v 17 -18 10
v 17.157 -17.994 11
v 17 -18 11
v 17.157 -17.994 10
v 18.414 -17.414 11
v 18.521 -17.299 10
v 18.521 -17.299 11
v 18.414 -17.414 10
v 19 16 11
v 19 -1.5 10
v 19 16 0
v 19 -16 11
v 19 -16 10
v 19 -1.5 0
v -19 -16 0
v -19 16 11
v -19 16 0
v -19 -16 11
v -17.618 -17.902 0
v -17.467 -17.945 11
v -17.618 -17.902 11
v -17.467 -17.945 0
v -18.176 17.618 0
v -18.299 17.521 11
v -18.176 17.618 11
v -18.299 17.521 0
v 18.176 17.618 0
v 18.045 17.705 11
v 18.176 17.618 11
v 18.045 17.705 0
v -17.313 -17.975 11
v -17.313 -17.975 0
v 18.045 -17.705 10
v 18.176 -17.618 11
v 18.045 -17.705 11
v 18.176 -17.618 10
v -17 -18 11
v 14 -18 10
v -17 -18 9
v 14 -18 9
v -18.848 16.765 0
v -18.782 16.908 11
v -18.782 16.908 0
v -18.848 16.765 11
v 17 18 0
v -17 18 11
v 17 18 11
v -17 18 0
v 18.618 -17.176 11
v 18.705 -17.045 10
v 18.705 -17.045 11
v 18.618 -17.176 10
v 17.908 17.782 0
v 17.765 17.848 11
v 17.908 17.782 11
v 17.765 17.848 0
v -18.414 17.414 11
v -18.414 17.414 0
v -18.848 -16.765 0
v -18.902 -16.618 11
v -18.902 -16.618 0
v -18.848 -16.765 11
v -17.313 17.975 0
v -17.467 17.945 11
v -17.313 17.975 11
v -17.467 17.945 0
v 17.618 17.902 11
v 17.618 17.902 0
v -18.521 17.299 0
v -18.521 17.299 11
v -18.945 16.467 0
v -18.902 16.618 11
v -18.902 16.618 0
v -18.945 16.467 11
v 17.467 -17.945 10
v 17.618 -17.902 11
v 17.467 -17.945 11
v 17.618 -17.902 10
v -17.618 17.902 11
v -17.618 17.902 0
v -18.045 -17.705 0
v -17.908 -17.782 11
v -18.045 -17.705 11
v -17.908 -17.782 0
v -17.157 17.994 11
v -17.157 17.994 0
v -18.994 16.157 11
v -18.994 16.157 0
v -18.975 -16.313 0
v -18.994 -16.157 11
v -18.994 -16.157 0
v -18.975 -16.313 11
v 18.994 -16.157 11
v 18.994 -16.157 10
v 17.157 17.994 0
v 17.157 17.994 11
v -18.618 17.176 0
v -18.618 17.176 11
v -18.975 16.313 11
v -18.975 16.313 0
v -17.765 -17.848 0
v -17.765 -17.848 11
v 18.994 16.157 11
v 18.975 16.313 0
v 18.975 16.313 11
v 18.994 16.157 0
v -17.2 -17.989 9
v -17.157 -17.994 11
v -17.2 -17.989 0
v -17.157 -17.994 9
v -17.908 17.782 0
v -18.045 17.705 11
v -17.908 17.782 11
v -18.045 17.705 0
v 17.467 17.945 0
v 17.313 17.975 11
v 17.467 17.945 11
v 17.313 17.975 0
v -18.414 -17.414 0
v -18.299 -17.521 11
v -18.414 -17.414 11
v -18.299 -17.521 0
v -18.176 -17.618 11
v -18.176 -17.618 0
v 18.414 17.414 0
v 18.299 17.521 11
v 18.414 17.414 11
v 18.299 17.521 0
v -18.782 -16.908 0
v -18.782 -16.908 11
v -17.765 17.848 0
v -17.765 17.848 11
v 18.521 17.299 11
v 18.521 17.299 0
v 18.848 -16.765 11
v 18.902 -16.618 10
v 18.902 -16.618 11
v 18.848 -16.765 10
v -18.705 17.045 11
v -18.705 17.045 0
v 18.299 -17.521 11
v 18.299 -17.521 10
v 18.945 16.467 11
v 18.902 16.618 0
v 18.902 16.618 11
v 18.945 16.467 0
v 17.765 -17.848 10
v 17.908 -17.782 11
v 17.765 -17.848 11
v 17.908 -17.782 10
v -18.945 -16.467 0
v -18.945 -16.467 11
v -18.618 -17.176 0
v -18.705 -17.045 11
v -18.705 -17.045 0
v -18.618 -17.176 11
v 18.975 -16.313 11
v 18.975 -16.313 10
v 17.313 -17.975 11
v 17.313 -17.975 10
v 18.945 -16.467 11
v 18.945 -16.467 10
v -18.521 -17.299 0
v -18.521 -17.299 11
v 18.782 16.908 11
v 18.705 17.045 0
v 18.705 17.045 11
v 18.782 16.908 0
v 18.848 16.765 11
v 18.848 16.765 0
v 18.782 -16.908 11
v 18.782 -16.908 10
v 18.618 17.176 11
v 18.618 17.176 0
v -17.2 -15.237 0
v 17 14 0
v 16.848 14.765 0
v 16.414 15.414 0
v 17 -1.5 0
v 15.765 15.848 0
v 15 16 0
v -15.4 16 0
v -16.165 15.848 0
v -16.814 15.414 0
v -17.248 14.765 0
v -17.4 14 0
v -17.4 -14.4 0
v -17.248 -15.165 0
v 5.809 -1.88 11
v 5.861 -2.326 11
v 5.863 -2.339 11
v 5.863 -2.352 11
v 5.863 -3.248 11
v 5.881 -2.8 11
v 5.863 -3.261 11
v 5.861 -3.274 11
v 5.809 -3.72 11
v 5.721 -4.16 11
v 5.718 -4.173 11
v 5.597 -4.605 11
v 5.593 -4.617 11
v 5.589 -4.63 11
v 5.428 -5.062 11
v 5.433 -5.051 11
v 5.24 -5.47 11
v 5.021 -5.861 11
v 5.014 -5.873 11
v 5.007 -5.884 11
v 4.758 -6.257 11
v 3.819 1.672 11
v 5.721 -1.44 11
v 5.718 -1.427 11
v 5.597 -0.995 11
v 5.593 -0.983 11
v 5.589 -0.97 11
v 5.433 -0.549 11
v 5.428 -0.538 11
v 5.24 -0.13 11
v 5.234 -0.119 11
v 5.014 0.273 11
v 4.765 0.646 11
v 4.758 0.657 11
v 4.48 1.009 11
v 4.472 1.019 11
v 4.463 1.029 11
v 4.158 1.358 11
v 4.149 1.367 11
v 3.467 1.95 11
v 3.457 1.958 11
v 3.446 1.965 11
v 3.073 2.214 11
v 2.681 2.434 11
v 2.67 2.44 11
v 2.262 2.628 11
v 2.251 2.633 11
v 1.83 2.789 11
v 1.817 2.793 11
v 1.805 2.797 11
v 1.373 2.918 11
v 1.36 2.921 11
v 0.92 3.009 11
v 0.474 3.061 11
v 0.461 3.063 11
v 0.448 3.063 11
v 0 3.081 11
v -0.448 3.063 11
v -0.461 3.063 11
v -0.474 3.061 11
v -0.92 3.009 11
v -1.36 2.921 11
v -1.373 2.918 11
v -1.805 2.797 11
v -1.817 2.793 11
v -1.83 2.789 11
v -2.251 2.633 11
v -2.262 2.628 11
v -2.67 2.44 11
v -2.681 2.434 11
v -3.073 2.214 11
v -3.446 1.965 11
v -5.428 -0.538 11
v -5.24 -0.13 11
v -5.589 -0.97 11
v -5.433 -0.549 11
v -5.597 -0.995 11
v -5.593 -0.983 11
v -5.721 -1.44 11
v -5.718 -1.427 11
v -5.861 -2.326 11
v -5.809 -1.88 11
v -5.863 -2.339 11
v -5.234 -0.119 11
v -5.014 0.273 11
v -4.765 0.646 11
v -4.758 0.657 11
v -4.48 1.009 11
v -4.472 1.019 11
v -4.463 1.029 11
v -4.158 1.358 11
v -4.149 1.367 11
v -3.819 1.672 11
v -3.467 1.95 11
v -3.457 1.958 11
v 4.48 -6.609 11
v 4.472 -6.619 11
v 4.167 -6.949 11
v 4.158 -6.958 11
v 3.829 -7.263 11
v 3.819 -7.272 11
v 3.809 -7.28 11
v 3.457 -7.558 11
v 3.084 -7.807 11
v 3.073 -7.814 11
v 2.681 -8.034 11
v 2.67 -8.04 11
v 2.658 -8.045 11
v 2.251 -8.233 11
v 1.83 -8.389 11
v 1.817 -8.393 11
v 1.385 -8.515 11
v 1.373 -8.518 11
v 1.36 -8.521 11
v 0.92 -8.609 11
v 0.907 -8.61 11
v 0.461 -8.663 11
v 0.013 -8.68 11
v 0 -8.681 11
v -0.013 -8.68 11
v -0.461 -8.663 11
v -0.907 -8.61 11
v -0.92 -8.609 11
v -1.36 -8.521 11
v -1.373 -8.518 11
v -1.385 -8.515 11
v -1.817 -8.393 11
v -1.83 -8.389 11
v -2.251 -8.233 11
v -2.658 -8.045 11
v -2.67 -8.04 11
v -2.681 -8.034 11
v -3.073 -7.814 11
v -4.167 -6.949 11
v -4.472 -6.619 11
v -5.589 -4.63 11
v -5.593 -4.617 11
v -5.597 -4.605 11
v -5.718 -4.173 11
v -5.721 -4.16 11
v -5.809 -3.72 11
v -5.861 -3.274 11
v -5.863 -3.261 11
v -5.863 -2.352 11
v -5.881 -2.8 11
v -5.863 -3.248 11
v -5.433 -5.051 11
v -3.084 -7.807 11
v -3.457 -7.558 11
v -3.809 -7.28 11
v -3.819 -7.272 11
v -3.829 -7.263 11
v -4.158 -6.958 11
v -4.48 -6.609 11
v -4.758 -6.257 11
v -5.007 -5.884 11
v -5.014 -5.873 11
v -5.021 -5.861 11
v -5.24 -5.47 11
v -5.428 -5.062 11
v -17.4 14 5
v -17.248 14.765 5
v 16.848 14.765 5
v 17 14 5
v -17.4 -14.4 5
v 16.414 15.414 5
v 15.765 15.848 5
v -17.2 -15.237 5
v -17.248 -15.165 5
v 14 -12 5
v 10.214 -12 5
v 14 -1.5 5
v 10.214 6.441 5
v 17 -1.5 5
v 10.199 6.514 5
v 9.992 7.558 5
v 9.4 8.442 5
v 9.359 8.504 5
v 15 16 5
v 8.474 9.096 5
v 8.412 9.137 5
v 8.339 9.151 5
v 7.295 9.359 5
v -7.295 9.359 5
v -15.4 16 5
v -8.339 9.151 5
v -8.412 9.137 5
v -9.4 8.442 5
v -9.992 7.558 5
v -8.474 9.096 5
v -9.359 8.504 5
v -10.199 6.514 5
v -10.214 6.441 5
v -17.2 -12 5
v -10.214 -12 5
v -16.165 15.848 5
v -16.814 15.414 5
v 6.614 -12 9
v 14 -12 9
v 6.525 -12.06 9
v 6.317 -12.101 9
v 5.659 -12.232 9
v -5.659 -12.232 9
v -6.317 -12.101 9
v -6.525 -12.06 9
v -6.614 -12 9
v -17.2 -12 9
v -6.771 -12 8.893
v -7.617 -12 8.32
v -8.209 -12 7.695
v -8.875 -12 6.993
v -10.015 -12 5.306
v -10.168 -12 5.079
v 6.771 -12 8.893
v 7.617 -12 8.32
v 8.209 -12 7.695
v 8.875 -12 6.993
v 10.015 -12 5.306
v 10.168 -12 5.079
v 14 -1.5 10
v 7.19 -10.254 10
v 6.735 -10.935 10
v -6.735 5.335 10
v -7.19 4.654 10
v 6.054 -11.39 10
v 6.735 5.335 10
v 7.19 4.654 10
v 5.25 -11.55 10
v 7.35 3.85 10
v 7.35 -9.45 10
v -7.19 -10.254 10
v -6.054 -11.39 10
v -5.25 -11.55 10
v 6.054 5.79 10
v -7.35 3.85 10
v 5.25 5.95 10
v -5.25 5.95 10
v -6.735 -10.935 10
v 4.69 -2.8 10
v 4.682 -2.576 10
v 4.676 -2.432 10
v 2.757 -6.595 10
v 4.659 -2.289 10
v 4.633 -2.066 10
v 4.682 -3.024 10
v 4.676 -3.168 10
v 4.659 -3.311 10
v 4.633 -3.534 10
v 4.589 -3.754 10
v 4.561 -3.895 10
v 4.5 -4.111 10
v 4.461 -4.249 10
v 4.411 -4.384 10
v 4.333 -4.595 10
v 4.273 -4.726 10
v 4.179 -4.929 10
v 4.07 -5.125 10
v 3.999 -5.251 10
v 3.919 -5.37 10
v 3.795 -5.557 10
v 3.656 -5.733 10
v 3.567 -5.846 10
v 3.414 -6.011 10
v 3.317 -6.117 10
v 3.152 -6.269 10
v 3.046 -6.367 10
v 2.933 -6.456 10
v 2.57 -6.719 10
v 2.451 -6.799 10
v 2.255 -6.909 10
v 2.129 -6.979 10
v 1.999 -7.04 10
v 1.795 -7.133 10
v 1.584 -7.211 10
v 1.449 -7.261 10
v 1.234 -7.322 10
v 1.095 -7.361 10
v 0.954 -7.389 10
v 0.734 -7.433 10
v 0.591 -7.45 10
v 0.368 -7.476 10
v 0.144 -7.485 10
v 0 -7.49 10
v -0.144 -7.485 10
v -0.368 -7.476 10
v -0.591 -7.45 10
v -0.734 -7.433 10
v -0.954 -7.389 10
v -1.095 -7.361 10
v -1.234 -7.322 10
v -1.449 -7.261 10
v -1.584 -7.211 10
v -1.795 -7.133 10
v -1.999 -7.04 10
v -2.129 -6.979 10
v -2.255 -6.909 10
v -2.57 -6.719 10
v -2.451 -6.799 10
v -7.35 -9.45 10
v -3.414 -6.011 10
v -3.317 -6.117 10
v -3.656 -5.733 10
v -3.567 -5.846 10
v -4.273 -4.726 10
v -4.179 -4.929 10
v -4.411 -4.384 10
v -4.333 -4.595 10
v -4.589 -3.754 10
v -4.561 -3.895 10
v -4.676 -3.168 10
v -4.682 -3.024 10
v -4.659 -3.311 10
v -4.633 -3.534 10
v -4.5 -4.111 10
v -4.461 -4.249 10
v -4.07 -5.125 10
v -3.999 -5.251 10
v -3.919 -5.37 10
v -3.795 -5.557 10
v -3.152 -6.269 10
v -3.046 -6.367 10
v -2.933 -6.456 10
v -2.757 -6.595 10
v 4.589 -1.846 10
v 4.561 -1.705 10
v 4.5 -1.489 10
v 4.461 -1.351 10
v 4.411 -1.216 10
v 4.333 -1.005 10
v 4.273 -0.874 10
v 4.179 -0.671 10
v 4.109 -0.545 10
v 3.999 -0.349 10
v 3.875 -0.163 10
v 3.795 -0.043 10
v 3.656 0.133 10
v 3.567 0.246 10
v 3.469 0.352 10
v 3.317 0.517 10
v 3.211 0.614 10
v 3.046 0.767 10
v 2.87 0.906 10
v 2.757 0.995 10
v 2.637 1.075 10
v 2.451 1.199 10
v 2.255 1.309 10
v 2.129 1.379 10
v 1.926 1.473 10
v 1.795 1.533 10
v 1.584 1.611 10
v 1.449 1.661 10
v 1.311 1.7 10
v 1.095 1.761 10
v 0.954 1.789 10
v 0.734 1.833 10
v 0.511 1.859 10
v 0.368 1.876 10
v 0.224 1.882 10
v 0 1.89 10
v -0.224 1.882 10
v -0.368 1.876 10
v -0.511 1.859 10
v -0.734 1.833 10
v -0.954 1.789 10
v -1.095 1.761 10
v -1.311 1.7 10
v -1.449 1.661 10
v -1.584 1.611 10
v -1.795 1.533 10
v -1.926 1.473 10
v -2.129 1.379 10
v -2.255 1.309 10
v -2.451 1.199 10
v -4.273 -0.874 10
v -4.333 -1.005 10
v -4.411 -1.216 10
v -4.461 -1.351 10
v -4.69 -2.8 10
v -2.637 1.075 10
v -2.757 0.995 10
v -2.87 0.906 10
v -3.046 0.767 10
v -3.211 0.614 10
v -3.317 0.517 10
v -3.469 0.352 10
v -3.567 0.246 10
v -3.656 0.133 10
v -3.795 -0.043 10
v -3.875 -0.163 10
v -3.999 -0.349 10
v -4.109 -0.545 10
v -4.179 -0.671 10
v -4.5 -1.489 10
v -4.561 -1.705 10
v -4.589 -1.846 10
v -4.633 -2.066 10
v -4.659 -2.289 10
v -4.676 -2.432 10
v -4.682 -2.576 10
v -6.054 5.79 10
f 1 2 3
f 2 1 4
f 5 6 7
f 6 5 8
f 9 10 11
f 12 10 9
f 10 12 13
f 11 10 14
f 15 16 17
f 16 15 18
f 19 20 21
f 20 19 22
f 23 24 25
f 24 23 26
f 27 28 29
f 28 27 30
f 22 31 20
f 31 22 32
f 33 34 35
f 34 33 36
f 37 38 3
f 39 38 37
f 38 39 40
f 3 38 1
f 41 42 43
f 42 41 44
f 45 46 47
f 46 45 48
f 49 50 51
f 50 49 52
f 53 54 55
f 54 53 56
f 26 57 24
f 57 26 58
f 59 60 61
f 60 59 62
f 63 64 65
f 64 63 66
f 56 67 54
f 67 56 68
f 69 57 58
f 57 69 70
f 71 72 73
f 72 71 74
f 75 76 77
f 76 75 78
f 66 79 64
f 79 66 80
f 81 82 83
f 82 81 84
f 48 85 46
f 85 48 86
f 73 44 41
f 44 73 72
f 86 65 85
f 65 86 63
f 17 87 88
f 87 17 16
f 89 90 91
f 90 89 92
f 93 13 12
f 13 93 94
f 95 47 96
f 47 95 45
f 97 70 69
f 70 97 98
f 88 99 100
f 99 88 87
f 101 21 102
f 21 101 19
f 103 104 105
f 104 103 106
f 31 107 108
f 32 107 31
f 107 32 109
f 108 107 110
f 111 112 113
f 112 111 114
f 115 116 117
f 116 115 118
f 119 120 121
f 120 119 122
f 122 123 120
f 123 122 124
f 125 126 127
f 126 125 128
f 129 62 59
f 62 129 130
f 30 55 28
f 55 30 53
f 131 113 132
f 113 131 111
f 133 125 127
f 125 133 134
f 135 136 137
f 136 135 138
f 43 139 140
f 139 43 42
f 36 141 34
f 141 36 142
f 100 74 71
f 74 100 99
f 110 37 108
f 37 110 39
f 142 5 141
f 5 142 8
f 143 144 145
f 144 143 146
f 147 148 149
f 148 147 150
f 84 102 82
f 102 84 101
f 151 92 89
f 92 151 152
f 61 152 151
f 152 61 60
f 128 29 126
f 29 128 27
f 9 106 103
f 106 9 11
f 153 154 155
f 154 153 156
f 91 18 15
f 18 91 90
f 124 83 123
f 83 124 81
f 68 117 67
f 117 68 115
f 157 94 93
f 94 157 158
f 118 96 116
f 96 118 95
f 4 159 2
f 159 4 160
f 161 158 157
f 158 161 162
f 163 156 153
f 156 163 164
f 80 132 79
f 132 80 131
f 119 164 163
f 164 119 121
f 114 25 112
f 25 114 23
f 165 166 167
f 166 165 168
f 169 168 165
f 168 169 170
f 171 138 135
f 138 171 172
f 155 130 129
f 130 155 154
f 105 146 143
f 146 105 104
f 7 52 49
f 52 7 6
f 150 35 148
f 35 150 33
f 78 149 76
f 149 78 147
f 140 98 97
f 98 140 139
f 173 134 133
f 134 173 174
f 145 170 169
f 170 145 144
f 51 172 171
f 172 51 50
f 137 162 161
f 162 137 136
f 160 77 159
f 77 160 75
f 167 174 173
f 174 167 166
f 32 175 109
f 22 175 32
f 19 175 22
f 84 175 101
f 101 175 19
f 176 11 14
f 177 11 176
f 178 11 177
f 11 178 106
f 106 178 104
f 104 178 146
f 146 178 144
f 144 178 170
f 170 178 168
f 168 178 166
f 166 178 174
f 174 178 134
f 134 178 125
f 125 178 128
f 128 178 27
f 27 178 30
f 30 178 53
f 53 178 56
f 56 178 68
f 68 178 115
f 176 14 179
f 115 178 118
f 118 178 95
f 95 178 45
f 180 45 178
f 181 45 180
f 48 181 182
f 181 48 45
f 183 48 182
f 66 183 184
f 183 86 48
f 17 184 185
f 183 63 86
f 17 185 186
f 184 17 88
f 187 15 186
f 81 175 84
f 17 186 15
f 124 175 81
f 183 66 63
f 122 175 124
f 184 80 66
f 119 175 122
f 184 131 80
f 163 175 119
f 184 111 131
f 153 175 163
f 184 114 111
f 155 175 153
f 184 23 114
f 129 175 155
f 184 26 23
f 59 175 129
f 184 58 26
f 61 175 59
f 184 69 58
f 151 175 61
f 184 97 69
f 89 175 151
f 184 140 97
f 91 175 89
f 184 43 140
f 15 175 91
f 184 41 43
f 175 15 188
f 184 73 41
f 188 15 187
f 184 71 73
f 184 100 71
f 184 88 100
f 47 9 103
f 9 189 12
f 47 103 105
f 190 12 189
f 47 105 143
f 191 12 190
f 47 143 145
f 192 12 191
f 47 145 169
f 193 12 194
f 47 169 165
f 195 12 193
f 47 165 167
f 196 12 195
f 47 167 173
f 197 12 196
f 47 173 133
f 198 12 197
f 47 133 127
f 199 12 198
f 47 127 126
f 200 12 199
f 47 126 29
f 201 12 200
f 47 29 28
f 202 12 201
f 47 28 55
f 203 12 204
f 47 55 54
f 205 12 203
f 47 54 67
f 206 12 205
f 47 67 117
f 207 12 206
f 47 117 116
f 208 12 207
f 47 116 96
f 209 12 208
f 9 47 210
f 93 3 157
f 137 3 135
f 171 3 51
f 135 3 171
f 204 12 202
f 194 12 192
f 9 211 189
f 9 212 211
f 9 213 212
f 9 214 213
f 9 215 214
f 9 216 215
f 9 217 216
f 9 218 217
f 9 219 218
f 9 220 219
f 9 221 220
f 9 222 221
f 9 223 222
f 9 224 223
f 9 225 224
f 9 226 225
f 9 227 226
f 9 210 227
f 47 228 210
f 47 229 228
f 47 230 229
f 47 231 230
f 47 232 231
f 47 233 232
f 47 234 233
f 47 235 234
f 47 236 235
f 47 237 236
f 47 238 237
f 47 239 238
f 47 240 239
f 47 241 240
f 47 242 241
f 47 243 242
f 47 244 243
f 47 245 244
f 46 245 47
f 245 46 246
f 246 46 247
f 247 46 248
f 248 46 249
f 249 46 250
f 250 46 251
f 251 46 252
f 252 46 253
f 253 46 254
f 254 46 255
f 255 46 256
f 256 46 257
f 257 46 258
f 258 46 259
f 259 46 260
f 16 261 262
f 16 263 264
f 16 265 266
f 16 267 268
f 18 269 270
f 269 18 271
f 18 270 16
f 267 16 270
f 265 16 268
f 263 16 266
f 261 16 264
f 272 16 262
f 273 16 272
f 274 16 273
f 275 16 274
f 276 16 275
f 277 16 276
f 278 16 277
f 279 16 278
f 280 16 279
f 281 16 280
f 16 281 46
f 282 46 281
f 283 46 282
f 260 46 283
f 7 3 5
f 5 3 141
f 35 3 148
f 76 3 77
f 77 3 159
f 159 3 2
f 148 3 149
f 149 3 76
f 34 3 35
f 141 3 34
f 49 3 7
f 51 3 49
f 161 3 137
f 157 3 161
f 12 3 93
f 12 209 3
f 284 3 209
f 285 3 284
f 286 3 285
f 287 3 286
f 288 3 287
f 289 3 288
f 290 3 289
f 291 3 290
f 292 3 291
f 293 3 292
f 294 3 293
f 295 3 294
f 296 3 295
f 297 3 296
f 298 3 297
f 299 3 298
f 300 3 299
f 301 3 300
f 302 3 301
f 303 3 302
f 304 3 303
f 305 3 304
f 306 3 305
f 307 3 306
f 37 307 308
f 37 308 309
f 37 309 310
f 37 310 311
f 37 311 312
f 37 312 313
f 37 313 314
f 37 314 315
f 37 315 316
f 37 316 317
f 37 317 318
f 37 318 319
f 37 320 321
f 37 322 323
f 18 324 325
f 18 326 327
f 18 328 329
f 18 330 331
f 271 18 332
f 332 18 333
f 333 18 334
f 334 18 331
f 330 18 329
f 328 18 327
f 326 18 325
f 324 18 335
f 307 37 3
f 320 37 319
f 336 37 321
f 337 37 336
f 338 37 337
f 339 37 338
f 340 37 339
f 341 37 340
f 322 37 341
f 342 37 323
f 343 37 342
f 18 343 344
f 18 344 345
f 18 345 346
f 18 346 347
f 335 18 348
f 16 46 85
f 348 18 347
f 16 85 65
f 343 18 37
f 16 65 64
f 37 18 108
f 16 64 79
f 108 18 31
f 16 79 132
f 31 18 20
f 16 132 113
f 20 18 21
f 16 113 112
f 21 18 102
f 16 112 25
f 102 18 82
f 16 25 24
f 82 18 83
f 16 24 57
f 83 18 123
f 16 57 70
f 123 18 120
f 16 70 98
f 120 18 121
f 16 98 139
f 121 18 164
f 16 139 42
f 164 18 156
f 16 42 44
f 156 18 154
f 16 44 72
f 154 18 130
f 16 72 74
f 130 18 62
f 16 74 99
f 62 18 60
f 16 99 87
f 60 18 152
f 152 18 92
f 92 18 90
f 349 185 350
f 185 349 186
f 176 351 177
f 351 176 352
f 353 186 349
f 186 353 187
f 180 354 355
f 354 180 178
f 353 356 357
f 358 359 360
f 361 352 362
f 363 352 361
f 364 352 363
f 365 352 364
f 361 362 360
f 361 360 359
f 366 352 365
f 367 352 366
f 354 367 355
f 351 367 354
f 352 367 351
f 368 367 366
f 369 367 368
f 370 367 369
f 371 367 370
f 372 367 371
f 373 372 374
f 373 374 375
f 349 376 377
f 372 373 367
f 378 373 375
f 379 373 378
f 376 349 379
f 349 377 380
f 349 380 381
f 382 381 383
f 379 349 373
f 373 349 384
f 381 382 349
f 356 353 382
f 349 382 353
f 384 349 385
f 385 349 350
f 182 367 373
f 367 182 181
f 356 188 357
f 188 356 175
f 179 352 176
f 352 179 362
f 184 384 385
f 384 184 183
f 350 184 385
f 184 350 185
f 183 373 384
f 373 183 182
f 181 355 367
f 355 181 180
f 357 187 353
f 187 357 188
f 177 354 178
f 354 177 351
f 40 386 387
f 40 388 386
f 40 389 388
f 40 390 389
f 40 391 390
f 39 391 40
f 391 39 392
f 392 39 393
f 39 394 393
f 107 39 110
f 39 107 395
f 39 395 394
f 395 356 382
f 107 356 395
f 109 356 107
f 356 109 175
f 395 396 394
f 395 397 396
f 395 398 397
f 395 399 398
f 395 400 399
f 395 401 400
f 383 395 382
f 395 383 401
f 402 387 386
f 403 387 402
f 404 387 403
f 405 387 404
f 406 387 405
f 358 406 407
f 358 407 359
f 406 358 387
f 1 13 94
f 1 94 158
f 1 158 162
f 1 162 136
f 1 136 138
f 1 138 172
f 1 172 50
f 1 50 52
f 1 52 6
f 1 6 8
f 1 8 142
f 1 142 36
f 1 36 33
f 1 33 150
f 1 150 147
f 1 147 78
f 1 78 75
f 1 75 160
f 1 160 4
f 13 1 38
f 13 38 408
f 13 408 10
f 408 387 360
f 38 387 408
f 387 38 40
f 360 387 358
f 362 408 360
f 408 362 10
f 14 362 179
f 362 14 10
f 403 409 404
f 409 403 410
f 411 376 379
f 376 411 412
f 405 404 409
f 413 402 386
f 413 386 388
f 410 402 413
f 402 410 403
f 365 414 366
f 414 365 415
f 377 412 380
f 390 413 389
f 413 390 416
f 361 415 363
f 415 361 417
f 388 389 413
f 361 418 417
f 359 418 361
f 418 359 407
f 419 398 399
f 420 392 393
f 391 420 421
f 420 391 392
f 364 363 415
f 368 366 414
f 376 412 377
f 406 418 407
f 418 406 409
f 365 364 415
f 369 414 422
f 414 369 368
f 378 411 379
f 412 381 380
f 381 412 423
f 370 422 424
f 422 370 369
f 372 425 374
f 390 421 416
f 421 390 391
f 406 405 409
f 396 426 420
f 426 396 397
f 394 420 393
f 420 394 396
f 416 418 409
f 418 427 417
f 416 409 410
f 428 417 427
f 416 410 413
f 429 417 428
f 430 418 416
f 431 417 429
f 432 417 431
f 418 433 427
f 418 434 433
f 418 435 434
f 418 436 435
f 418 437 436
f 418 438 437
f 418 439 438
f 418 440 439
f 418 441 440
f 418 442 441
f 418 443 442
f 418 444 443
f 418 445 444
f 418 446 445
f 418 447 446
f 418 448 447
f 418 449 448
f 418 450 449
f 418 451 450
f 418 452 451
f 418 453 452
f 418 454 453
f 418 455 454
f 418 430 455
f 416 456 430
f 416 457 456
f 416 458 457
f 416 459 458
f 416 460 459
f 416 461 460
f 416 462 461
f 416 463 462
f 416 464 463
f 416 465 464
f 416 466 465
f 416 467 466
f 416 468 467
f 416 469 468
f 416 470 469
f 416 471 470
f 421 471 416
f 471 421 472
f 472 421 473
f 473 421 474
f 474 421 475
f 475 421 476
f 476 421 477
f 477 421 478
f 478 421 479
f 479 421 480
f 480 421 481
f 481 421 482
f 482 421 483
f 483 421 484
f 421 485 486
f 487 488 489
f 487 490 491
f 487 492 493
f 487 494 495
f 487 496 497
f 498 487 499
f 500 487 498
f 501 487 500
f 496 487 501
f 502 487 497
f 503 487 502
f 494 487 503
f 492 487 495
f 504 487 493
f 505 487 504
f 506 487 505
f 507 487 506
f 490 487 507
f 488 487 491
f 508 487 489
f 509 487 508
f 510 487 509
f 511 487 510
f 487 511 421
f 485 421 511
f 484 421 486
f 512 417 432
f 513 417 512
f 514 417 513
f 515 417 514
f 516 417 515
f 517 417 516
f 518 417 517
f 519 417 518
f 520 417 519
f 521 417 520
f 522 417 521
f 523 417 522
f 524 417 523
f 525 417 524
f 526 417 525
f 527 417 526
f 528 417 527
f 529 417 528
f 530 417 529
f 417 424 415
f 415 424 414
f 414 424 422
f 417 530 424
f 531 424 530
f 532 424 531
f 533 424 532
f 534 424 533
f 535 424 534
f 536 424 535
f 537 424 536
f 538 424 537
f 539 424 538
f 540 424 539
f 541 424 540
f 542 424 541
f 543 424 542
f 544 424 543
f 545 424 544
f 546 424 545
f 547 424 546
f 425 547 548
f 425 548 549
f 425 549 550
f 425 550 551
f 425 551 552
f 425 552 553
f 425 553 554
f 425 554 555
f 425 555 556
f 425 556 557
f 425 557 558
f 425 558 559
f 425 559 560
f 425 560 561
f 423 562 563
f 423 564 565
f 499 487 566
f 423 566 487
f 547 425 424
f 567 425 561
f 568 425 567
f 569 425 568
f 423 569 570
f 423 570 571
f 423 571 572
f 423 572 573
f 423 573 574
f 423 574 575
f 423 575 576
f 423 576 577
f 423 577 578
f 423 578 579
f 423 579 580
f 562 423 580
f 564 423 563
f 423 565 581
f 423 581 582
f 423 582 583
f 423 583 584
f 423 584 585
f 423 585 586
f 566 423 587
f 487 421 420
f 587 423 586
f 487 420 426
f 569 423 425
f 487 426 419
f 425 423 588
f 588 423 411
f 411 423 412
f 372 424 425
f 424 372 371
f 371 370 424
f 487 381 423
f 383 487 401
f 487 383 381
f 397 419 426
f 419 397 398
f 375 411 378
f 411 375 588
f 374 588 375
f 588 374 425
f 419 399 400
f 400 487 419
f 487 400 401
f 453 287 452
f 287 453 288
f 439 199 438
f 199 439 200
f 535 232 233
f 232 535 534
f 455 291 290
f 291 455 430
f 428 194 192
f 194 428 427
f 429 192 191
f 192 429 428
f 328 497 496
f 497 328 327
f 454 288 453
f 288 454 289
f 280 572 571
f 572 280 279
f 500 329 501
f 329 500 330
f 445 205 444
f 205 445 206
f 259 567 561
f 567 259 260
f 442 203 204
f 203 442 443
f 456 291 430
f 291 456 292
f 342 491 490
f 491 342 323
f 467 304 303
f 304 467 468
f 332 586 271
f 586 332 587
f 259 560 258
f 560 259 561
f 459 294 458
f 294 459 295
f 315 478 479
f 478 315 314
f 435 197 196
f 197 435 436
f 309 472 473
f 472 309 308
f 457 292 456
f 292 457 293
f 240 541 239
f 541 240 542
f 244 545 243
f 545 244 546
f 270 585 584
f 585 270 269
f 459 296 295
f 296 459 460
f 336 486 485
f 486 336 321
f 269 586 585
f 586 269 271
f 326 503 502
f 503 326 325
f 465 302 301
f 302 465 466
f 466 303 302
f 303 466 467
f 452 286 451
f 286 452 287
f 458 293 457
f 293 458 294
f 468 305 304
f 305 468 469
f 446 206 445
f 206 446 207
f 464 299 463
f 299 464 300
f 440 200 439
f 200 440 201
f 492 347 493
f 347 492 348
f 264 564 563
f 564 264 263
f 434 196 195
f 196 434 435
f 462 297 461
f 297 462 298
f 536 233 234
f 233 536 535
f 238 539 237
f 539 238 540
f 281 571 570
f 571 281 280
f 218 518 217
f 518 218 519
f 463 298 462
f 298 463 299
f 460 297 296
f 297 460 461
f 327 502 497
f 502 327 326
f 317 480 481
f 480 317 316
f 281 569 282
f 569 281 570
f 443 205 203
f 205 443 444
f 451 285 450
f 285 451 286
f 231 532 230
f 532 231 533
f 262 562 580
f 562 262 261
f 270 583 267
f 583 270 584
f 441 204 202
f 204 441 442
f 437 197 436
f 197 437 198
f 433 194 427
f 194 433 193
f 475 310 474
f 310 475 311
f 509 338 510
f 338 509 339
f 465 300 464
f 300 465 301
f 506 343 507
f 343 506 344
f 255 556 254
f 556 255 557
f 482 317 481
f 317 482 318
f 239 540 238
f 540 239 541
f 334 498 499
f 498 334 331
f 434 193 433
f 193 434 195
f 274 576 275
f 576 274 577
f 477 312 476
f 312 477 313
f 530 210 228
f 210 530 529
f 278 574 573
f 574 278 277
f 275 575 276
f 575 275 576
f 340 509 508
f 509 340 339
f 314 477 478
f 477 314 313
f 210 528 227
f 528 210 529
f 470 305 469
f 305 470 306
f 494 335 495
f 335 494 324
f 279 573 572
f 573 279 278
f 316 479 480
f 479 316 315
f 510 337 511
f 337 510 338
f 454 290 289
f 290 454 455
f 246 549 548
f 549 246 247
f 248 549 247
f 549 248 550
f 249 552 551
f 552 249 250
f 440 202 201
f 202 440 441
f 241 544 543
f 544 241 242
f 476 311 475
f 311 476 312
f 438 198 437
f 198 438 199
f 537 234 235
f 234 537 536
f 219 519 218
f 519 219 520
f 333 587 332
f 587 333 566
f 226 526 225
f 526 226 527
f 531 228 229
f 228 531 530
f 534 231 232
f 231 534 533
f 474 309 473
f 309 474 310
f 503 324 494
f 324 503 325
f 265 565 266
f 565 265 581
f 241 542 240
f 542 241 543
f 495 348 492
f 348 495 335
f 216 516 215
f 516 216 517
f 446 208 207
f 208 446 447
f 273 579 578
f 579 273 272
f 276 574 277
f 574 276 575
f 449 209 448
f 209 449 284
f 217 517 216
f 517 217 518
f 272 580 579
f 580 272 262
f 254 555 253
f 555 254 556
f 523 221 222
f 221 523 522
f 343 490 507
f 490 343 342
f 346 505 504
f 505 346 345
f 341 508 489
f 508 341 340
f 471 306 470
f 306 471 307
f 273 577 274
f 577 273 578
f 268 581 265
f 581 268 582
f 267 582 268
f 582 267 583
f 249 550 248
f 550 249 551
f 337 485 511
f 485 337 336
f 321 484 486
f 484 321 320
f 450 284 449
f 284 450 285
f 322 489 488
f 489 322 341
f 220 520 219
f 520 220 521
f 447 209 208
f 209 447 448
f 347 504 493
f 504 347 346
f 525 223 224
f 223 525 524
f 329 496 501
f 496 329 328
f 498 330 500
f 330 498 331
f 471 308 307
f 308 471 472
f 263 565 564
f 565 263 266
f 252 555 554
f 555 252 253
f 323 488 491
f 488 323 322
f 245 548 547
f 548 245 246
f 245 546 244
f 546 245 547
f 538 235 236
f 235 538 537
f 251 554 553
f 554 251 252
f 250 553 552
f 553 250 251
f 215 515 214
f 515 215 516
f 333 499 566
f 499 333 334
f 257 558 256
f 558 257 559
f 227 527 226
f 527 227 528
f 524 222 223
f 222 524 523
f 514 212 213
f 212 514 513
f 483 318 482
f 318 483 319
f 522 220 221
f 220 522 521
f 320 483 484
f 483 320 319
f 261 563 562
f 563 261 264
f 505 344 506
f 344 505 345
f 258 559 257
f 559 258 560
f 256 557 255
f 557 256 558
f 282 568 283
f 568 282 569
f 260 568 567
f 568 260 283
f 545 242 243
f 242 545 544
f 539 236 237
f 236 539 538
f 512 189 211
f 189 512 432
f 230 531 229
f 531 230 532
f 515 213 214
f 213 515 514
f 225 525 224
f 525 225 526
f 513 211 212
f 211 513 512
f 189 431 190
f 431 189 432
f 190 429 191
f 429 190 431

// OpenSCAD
// camlid
// lid that covers the camera part
module camlid(){
    tol=0.2;
    
difference(){
union(){
    // main boss
    translate([0,0,0])
    color("yellow")
    linear_extrude(height=6)
    offset(r=2,$fn=80)    
    square(size=[34,32],center=true);

    // camera bump boss
    translate([0,0,6])
    color("green")
//    linear_extrude(height=5,scale=0.70)
    linear_extrude(height=5,scale=1)
    offset(r=2,$fn=80)
    square([34,32],center=true);

}
    // main boss cutout
    translate([-tol,-tol,-2])
    color("orange")
    linear_extrude(height=7)
    offset(r=2,$fn=16)    
    square(size=[30+tol*2,28+tol*2],center=true);

    // bottom cut for cable
    translate([-17-tol,-28,-1])
    color("green")
    cube([34+tol*2,16,10]);

    // cut for power lid
    translate([14,-22,-1])
    color("pink")
    cube([6,20.5,11]);

    // hollow out the camera bump
    translate([0,-2.8,4.5])
    color("green")
    linear_extrude(height=5.5,scale=0.70)
    offset(r=3,$fn=16)
    square([15,19],center=true);

    // hole for the lens
    translate([0,-2.8,9])
    color("cyan")
    cylinder(r1=3.5,r2=6.0,h=2.1,$fn=80);
}


}  // end of module 

camlid();
